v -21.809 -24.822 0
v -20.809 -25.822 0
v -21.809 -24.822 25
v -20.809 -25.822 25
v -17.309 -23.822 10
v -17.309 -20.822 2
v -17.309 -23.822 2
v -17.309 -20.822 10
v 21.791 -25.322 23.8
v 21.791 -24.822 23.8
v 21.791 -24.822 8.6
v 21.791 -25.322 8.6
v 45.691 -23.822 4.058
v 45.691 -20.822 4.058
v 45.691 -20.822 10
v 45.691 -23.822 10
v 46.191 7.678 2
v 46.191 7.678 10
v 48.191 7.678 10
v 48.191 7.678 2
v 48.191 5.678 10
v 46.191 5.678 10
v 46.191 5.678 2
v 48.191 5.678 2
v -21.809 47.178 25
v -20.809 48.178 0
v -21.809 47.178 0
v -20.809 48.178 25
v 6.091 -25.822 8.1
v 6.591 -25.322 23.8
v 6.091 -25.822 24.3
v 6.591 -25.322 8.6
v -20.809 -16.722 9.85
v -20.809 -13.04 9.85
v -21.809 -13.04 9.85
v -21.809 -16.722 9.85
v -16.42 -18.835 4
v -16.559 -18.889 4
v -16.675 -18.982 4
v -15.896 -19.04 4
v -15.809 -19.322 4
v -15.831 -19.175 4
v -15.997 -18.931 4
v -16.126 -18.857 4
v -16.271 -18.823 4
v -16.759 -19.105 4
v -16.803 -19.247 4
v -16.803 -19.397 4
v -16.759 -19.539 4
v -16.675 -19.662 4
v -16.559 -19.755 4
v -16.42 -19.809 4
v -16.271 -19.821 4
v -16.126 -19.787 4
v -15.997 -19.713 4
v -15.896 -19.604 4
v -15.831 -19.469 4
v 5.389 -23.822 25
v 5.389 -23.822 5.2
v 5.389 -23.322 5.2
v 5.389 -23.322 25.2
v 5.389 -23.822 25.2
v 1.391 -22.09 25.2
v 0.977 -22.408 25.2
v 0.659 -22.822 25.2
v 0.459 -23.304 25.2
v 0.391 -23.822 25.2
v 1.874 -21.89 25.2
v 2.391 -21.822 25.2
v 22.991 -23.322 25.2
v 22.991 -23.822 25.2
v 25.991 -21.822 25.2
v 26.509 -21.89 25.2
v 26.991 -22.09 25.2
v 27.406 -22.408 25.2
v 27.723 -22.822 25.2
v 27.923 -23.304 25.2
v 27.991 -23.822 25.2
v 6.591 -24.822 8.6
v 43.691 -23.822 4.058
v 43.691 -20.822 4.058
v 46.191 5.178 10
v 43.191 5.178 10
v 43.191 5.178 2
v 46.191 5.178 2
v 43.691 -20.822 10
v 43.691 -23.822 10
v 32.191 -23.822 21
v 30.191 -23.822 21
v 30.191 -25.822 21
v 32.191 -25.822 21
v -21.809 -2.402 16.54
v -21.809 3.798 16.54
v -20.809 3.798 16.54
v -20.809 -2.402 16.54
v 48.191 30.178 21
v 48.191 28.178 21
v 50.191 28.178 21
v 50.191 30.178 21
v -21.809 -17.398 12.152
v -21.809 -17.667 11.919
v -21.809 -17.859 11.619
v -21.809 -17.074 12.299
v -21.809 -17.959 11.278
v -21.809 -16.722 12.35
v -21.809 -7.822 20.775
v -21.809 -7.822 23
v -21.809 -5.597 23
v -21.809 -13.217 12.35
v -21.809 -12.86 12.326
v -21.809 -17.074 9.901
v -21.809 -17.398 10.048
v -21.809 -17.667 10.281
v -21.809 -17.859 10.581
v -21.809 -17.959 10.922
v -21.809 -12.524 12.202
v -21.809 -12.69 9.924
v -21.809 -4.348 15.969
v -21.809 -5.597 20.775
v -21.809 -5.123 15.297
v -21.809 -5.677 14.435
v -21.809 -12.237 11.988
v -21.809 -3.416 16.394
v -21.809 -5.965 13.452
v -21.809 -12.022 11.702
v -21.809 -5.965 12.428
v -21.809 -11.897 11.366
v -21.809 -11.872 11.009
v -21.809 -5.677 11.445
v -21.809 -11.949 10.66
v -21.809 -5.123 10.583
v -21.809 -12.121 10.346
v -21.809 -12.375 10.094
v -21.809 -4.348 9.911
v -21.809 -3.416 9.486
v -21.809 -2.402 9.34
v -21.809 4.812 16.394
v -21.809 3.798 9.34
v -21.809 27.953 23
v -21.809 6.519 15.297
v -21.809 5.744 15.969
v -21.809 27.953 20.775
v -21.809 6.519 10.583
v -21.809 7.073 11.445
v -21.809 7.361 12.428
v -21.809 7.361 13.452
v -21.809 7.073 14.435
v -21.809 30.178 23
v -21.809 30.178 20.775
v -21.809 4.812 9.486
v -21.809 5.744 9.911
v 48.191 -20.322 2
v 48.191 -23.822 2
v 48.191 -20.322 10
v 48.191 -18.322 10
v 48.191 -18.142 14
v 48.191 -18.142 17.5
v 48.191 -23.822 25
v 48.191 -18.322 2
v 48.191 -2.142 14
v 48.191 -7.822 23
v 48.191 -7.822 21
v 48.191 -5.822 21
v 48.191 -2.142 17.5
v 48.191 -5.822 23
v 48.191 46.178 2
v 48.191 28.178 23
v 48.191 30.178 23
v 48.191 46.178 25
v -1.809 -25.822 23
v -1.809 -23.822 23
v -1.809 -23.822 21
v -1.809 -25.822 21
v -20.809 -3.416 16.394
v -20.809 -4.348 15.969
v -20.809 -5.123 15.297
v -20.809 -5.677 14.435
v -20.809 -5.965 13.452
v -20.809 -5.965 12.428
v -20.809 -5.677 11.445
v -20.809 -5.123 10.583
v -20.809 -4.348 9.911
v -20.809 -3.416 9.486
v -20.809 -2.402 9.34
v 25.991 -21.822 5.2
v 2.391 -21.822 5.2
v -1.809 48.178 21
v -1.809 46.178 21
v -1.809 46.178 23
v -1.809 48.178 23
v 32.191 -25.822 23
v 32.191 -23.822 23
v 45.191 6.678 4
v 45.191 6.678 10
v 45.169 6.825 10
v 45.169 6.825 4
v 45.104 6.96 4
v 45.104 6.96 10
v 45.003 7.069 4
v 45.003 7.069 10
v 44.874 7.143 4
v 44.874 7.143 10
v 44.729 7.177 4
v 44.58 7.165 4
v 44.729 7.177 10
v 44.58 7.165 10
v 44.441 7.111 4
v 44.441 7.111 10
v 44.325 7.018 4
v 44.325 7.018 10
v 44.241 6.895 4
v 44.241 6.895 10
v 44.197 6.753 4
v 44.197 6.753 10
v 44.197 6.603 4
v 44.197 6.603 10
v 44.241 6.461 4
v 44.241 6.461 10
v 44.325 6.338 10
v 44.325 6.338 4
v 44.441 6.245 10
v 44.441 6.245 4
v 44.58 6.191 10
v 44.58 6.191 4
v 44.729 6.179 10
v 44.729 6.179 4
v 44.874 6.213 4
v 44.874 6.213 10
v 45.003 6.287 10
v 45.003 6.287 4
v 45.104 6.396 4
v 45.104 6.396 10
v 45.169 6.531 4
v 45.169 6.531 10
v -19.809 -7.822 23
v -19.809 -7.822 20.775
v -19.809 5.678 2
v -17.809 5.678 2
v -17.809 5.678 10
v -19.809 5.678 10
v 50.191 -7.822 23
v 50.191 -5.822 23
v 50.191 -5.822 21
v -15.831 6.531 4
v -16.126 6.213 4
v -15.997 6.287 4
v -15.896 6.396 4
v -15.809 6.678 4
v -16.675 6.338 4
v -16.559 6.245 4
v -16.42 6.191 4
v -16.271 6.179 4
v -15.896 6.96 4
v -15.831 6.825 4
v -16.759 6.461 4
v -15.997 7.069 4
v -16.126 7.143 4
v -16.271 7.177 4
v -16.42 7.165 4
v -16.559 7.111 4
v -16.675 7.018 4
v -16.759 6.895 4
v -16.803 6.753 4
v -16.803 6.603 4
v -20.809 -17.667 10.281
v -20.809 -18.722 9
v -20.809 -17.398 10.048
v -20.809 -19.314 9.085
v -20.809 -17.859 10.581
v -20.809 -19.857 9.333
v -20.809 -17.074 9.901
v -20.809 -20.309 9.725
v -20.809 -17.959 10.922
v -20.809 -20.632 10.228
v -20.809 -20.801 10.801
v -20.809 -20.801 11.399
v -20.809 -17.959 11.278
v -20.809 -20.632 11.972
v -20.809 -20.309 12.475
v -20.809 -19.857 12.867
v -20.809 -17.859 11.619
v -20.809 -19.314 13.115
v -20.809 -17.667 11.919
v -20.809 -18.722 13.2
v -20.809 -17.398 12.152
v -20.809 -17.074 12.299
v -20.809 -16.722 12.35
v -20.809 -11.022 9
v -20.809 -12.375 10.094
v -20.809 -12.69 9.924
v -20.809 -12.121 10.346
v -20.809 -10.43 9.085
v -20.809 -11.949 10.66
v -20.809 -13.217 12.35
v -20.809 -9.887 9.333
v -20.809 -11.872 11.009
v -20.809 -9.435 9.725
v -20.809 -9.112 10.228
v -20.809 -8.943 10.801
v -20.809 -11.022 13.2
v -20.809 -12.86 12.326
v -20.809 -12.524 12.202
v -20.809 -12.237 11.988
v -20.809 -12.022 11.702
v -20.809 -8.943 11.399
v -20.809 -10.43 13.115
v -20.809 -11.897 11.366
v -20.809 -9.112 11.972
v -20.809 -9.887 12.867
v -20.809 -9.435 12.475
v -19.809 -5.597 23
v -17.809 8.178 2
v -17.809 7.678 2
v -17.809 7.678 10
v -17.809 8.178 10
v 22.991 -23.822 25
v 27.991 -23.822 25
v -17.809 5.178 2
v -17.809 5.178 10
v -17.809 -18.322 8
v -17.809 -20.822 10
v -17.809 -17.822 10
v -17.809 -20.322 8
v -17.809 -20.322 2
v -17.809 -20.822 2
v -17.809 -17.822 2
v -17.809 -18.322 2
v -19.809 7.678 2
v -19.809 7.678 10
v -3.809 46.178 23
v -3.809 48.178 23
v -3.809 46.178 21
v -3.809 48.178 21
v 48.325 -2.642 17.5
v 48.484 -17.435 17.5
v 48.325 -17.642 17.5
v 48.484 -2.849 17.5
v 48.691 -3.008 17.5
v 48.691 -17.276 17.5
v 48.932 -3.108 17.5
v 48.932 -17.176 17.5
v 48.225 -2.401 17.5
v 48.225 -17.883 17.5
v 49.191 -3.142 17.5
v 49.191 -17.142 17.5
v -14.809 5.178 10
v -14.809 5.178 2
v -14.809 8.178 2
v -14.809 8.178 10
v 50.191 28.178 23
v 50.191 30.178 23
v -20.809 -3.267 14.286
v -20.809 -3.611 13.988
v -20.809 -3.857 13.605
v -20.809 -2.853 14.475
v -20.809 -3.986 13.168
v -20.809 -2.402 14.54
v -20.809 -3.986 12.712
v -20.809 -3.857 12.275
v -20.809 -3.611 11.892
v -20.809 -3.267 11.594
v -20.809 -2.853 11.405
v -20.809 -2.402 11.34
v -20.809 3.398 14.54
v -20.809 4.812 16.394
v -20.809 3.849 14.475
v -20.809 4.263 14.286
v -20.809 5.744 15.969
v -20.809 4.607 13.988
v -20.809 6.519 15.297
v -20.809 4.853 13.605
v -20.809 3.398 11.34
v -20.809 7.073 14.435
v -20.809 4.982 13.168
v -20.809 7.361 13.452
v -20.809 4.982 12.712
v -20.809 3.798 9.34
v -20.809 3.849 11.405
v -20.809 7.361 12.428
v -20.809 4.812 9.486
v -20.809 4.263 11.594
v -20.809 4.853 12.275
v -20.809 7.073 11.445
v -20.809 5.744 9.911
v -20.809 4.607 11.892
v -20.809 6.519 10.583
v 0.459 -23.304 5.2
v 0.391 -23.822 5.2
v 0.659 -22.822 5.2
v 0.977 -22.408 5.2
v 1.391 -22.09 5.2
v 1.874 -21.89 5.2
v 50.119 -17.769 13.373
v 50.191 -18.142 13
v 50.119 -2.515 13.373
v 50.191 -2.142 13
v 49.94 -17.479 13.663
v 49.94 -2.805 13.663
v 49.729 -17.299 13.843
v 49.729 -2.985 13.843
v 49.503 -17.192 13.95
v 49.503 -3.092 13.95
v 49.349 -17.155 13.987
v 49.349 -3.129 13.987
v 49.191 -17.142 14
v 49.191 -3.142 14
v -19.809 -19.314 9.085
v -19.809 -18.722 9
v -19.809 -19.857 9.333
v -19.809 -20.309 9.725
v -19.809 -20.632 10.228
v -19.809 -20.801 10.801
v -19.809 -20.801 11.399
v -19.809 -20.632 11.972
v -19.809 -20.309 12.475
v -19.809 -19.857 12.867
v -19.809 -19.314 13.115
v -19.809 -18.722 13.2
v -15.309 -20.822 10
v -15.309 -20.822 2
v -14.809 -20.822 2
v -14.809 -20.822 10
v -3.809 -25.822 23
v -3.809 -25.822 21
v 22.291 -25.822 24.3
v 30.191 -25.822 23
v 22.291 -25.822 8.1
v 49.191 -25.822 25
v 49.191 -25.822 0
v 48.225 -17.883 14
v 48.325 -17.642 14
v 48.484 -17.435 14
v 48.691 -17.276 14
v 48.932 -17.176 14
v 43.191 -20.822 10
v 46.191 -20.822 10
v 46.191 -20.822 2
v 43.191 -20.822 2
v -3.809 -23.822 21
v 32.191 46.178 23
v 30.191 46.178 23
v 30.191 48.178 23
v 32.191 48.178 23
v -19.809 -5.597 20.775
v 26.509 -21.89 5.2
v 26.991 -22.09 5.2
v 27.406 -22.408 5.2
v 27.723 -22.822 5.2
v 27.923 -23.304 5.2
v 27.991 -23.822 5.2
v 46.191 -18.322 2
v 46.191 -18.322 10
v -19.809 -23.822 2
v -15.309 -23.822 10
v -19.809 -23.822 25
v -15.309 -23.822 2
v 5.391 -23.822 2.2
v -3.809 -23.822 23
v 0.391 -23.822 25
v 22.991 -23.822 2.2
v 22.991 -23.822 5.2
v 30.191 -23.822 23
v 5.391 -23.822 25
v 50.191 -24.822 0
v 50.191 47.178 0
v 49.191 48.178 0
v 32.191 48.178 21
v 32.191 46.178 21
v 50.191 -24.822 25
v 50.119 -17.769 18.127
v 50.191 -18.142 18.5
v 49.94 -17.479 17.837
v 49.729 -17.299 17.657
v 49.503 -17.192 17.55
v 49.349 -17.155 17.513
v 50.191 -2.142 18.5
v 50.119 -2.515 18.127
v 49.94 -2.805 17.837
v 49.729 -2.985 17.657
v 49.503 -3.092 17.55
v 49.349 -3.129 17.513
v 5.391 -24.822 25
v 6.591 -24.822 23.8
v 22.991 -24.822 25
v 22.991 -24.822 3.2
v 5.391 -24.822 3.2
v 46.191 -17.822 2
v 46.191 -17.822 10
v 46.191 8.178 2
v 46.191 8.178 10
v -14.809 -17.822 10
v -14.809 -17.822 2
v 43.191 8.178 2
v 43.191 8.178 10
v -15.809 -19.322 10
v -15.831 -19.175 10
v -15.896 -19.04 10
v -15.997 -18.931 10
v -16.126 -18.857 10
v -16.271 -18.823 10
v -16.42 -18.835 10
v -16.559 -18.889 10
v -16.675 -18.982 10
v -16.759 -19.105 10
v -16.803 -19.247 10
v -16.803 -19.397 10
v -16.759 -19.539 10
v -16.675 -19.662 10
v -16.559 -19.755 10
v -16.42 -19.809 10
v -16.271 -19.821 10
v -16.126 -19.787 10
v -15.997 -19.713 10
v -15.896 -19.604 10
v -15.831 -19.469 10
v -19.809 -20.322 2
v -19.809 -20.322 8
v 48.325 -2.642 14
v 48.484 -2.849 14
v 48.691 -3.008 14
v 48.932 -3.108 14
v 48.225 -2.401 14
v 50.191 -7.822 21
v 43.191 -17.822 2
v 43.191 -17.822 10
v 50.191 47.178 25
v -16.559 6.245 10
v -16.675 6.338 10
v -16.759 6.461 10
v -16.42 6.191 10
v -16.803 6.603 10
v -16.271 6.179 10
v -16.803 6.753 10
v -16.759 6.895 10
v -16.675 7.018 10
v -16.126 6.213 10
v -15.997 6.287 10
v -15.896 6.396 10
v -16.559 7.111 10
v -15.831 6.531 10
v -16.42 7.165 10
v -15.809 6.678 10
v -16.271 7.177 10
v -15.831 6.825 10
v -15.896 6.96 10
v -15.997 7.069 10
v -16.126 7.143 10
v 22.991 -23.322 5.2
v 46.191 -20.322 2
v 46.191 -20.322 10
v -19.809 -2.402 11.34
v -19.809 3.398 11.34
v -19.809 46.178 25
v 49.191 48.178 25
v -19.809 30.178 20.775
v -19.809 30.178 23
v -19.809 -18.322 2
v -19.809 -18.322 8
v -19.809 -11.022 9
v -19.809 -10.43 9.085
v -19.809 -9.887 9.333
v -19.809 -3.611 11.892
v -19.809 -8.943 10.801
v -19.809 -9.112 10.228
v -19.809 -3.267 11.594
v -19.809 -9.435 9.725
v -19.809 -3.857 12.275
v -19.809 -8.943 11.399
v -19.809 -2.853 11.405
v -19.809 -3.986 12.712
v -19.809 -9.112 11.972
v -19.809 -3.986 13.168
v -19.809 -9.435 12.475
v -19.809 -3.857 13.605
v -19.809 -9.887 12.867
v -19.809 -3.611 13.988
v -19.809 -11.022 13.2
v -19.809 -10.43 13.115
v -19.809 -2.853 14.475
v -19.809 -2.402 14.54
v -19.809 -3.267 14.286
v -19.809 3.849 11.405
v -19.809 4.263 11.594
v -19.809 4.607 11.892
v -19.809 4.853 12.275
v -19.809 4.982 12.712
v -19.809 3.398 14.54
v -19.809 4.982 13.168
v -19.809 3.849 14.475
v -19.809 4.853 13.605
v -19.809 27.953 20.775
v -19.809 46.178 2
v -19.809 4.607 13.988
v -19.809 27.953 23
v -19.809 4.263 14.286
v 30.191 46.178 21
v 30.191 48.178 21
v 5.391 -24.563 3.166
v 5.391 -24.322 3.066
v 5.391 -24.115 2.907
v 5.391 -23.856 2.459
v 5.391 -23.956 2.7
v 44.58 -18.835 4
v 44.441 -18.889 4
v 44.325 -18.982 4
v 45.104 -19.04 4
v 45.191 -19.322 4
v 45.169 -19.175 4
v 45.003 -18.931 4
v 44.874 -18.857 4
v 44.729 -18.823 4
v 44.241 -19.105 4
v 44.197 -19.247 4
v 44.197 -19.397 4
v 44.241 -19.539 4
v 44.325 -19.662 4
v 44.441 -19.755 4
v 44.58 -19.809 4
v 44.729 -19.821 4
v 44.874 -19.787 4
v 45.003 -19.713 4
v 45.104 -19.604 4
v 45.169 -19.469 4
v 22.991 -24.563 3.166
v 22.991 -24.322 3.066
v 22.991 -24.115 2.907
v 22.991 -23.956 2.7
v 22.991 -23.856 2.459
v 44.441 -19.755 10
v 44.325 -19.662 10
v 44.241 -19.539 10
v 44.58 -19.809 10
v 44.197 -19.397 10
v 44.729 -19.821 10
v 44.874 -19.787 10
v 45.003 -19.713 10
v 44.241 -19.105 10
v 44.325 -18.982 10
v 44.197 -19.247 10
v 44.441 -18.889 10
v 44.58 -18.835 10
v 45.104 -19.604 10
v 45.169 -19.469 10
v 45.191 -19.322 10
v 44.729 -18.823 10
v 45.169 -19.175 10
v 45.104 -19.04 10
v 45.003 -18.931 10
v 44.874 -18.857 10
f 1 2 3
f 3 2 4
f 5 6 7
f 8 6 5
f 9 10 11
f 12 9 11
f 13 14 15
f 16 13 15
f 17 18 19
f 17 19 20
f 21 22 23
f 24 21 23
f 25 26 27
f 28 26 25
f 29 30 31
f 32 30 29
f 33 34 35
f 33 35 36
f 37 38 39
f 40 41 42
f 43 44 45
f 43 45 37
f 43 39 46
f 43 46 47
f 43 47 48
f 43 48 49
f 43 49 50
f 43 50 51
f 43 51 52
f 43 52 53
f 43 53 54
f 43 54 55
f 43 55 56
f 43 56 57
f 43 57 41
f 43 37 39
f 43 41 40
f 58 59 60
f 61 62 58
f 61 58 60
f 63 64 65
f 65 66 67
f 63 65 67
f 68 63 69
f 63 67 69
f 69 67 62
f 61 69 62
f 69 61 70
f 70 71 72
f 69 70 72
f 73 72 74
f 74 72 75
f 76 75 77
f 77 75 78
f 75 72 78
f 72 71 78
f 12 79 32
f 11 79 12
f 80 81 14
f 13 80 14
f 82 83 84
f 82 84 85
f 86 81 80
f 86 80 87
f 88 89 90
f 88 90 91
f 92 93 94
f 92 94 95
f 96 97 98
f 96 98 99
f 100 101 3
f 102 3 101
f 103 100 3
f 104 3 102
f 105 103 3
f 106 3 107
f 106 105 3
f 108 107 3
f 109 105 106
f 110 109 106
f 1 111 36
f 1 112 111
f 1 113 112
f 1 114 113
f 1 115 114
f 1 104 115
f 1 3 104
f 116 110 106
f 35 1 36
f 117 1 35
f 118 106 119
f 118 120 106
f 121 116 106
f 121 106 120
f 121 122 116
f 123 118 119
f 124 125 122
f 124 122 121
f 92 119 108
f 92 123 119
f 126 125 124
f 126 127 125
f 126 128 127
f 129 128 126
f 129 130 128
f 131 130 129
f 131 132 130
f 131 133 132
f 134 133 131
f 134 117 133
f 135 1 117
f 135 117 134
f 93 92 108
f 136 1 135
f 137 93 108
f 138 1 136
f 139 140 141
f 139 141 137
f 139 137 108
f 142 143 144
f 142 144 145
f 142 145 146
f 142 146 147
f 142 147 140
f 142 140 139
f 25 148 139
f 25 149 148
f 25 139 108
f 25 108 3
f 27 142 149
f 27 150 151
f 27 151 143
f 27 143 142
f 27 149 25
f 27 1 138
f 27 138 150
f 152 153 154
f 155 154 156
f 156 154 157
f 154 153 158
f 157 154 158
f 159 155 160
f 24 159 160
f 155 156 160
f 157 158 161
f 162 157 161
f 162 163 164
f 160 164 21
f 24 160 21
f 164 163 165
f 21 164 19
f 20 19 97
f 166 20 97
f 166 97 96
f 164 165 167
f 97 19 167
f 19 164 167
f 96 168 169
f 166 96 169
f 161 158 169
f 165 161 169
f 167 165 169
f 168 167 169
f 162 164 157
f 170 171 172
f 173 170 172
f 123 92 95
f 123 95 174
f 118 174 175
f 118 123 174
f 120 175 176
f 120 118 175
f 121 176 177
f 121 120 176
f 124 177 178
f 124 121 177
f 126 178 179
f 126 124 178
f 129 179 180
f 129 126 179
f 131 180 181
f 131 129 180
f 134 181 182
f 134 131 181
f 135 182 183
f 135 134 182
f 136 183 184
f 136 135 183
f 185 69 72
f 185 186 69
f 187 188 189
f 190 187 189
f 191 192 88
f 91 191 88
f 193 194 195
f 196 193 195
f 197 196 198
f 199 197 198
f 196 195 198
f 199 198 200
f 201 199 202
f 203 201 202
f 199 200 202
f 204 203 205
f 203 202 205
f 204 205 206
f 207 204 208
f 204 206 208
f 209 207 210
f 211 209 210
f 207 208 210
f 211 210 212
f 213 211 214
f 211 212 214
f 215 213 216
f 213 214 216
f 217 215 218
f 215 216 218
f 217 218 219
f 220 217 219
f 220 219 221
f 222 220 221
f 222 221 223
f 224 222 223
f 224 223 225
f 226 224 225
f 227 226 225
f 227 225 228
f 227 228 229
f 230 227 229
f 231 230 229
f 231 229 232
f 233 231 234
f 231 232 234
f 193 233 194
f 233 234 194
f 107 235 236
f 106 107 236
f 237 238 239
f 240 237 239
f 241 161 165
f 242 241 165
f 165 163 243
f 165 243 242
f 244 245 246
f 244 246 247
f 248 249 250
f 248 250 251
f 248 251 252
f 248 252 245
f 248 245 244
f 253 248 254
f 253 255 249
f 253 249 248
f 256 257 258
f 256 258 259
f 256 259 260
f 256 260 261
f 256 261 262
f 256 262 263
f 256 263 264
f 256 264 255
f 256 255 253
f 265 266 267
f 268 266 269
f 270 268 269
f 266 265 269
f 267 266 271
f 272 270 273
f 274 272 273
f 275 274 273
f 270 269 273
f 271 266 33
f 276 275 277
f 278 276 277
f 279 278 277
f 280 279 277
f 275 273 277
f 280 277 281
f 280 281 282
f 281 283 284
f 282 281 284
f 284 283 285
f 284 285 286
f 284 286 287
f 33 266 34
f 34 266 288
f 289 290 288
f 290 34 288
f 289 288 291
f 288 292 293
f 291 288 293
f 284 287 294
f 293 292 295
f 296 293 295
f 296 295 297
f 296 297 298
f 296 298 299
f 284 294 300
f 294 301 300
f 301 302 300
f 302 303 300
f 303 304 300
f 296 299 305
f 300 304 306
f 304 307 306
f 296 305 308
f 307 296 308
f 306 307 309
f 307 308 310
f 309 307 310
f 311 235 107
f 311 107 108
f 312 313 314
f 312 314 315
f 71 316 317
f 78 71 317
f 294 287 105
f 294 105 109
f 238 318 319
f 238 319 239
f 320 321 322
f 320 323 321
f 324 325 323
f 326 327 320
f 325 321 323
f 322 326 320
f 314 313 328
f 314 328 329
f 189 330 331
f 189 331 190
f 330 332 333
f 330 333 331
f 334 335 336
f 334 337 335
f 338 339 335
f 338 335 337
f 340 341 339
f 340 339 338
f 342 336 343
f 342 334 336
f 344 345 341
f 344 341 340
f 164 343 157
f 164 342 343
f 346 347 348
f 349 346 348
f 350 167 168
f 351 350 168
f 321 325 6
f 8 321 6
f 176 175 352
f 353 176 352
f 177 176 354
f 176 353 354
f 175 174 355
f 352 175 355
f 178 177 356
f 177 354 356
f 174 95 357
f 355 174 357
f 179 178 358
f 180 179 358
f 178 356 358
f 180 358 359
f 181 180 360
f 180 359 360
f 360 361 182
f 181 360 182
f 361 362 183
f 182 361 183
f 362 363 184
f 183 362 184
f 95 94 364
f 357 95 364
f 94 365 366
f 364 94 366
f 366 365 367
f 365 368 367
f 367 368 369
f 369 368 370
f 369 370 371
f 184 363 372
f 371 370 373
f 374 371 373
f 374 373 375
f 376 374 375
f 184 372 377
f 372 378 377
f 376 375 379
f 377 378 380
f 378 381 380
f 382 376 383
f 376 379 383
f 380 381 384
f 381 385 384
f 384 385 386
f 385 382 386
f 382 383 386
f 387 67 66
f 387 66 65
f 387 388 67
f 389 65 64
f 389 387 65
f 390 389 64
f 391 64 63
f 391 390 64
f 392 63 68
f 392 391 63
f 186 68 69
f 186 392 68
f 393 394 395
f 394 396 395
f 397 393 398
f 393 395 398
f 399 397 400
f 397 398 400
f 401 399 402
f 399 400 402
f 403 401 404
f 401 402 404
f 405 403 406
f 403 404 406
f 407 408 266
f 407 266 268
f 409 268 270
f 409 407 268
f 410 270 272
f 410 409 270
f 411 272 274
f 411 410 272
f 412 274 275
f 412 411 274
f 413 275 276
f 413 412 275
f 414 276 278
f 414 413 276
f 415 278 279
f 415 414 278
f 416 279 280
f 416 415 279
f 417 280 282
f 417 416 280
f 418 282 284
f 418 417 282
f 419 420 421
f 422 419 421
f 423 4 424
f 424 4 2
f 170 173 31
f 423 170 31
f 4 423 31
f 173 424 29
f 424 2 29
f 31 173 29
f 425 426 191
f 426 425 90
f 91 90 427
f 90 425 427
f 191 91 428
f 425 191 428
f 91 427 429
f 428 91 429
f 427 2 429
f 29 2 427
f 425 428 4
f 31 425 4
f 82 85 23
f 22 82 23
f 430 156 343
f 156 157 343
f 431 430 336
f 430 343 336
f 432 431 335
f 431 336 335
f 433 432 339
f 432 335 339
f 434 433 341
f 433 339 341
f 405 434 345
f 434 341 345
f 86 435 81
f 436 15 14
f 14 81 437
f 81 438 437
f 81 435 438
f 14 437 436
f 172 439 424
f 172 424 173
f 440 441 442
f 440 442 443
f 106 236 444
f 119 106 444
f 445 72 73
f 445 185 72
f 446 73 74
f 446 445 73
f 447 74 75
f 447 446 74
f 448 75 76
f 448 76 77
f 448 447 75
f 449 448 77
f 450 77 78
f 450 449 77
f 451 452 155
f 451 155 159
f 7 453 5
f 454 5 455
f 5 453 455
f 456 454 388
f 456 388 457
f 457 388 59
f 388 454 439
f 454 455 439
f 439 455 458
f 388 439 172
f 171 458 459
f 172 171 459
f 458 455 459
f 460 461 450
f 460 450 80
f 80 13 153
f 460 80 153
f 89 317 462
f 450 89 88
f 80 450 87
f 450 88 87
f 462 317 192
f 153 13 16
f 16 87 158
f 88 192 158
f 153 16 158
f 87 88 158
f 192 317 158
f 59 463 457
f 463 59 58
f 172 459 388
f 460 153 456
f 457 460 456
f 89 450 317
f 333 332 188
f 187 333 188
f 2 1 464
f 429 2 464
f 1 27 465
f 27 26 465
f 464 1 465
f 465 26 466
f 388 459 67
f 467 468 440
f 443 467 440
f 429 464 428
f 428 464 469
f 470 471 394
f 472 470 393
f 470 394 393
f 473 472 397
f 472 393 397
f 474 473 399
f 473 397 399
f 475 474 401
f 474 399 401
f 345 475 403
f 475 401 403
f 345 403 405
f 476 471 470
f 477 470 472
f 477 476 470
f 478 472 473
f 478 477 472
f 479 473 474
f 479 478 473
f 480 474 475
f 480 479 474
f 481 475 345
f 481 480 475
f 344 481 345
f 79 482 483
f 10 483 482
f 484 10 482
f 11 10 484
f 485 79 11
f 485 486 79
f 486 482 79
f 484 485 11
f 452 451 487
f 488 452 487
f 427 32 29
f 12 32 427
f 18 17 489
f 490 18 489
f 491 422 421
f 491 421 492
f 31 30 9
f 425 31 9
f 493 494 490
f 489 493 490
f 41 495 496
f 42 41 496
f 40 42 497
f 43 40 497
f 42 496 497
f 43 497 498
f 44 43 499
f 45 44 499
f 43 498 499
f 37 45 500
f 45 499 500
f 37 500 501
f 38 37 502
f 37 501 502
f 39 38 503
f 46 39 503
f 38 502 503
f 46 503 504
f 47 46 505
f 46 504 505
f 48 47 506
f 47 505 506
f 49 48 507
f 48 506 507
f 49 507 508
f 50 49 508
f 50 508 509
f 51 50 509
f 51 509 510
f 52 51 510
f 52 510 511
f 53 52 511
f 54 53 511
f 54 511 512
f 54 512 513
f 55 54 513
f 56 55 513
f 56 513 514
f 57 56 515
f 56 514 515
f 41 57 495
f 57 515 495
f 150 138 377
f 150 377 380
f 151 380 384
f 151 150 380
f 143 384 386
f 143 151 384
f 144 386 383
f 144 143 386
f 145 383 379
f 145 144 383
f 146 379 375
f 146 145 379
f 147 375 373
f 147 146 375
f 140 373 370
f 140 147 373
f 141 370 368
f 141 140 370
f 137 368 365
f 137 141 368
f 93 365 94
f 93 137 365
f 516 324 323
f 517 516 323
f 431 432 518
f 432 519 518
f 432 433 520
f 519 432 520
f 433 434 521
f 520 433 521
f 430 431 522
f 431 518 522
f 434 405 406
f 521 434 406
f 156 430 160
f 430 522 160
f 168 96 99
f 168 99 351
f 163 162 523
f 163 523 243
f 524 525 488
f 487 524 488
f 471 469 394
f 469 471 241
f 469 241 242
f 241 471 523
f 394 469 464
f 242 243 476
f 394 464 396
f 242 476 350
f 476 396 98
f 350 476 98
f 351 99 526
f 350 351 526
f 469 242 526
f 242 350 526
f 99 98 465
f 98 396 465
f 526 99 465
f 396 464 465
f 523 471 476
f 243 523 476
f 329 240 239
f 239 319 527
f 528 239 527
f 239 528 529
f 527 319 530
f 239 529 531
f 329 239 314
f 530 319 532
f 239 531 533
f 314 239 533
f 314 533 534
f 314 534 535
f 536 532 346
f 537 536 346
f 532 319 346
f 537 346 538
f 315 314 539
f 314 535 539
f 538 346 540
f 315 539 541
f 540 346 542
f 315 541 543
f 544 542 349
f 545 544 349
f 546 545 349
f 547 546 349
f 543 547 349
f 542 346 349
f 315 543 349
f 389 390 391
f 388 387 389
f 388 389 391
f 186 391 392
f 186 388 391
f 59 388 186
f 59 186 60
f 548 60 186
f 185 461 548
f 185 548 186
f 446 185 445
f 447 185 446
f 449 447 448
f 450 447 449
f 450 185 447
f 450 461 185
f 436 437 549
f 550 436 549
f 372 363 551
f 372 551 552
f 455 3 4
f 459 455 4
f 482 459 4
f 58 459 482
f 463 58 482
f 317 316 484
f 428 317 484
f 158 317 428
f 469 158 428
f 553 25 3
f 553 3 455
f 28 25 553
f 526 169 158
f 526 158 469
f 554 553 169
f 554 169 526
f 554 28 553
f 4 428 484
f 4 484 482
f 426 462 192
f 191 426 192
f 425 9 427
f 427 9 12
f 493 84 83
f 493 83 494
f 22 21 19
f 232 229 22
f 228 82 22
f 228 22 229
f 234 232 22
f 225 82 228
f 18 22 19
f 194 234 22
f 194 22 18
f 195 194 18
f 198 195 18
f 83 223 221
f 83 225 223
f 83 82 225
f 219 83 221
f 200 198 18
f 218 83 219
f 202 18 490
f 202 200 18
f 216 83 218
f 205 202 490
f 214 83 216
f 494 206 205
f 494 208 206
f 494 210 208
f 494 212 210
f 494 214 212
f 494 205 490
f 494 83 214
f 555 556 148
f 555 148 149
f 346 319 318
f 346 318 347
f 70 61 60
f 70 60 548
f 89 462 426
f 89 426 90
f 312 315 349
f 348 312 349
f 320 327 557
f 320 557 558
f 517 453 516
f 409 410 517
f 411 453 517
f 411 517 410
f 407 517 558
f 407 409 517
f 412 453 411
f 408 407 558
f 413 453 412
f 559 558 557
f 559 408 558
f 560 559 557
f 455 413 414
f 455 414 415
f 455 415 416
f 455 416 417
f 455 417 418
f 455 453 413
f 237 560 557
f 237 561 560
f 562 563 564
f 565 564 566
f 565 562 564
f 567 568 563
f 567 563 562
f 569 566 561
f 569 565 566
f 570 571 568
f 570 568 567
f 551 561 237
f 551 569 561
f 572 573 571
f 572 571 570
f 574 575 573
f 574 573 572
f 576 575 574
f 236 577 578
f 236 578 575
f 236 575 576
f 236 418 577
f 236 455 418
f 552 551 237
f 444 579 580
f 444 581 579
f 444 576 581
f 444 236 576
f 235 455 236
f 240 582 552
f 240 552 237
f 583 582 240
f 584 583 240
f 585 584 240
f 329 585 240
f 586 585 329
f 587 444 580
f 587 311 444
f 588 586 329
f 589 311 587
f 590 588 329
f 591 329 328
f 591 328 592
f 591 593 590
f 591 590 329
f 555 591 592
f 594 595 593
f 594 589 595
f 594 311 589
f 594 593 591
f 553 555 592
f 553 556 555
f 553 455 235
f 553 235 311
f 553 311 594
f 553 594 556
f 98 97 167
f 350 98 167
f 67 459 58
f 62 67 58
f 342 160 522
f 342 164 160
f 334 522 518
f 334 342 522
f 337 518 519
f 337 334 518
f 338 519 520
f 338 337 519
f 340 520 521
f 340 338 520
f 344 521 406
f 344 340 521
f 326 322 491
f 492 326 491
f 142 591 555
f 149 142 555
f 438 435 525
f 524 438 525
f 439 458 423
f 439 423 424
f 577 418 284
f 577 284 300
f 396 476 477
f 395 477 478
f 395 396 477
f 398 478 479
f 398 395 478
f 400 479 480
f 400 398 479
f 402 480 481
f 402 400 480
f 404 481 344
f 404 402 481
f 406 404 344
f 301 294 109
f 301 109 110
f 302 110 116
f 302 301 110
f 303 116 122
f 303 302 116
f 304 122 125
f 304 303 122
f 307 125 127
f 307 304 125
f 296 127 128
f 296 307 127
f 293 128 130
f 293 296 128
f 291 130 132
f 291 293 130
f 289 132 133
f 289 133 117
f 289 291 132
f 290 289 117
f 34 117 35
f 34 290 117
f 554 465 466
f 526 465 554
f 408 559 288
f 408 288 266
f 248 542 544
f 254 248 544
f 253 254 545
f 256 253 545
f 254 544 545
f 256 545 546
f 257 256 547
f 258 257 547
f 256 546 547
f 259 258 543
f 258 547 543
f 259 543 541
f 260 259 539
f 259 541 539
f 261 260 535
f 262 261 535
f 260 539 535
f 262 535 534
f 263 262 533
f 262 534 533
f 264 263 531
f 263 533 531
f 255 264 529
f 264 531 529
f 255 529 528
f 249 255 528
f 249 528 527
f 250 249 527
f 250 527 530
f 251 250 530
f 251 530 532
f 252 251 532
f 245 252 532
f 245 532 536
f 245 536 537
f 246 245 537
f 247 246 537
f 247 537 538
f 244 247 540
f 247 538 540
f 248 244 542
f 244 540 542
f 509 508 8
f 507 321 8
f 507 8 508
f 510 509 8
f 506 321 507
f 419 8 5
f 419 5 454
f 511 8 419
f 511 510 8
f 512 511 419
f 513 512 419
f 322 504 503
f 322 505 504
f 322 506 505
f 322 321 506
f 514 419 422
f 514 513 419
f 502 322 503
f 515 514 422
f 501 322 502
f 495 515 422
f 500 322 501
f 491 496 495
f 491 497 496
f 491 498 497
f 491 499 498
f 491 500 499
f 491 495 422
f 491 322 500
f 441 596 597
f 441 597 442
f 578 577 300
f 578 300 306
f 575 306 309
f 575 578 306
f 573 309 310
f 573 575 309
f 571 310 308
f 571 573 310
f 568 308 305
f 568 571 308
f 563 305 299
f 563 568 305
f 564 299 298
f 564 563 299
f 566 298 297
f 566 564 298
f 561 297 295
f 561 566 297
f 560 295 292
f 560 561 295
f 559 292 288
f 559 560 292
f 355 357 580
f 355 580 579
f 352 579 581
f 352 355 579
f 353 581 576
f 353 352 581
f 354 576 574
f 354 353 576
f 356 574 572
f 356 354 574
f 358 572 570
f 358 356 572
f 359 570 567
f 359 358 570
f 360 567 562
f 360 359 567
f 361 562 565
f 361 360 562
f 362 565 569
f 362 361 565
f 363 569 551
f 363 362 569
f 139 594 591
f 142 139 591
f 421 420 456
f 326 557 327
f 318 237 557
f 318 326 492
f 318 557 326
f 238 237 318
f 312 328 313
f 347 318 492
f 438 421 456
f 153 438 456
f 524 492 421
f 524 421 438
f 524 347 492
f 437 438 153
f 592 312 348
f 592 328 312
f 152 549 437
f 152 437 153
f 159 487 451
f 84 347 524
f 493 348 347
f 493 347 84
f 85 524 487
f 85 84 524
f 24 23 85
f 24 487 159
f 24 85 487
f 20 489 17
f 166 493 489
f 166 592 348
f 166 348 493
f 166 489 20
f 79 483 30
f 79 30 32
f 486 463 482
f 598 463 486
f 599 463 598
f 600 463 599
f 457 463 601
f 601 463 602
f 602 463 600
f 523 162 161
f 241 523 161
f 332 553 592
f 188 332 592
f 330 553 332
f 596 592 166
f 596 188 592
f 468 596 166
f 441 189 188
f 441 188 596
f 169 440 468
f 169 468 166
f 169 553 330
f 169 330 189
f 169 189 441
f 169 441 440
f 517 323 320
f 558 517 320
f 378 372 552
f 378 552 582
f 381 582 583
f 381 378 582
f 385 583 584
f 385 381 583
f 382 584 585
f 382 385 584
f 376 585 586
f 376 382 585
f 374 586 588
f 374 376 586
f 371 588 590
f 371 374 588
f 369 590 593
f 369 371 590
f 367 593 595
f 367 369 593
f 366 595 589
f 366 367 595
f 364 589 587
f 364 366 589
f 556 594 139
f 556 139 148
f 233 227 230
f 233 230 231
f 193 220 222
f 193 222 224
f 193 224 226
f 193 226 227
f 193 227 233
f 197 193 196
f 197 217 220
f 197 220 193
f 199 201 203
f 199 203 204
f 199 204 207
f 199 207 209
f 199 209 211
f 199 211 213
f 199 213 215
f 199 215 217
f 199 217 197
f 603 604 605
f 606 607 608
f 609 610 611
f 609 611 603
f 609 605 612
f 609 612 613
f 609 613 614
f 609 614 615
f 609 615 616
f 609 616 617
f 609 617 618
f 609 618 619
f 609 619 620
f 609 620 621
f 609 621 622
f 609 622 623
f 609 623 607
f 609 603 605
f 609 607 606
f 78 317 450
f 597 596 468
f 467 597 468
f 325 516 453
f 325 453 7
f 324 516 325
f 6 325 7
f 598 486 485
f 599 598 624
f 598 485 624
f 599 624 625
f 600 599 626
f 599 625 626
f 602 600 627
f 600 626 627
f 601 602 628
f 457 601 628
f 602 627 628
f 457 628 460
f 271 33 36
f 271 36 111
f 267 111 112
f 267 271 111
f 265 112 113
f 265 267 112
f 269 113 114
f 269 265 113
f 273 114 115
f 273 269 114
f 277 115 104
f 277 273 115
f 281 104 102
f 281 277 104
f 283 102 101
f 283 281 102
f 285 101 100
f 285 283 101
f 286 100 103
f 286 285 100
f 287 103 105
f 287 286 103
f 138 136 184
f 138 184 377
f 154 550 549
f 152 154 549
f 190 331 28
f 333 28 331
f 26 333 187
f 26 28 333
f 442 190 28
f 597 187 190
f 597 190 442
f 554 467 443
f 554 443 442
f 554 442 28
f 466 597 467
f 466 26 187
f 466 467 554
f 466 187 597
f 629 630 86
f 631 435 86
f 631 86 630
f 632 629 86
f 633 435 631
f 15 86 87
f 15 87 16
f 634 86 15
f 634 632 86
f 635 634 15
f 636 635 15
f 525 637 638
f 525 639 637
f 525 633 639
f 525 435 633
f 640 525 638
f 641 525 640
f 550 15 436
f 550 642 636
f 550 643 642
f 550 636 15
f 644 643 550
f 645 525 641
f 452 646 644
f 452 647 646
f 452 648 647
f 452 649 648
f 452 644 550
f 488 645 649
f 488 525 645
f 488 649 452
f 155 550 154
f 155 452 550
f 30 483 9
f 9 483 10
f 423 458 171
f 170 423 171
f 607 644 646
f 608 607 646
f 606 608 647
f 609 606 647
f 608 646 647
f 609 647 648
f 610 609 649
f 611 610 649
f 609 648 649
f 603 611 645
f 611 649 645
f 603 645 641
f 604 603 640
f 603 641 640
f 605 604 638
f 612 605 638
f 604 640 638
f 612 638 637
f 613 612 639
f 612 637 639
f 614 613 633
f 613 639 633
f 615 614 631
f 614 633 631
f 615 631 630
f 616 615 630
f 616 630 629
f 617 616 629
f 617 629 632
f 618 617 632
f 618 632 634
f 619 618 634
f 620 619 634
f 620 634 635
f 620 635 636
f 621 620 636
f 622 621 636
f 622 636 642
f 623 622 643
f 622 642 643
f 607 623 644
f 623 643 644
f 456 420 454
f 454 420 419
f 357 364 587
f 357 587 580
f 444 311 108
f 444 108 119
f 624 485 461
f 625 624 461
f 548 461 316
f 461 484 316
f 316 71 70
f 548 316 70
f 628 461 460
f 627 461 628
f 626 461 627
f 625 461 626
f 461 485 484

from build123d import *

# Parameters (mm, degrees)
SKETCH_1_W           = 72
SKETCH_1_H           = 74
EXTRUDE_1_DEPTH      = 25
SKETCH_2_W           = 68
SKETCH_2_H           = 70
CUT_EXTRUDE_1_DEPTH  = 23
CUT_EXTRUDE_2_REACH  = 93.259
SKETCH_3_W           = 2
SKETCH_3_H           = 2
CUT_EXTRUDE_3_REACH  = 90.578
SKETCH_4_W           = 2
SKETCH_4_H           = 2
CUT_EXTRUDE_4_REACH  = 93.259
SKETCH_5_W           = 2
SKETCH_5_H           = 2
CUT_EXTRUDE_5_REACH  = 90.578
SKETCH_6_W           = 2.225296774
SKETCH_6_H           = 2.225296773
SKETCH_6_H_2         = 2.225296774
SKETCH_7_W           = 3
SKETCH_7_H           = 3
EXTRUDE_2_DEPTH      = 8
SKETCH_10_R          = 0.5
CUT_EXTRUDE_6_DEPTH  = 6
EXTRUDE_3_REACH      = 89.006
SKETCH_12_W          = 6
SKETCH_12_H          = 2
SKETCH_12_W_2        = 8
EXTRUDE_4_REACH      = 89.006
SKETCH_13_W          = 8
SKETCH_13_H          = 2
EXTRUDE_5_REACH      = 90.911
SKETCH_14_W          = 2
SKETCH_14_H          = 8
SKETCH_14_H_2        = 5.942409556
CUT_EXTRUDE_8_DEPTH  = 1
CUT_EXTRUDE_9_DEPTH  = 1
CUT_EXTRUDE_10_DEPTH = 1
CUT_EXTRUDE_11_DEPTH = 1
CUT_EXTRUDE_12_REACH = 92.167
SKETCH_21_W          = 3.5
SKETCH_21_H          = 14
SKETCH_22_W          = 17.6
SKETCH_22_H          = 21.8
CUT_EXTRUDE_13_DEPTH = 1
SKETCH_24_W          = 15.2
SKETCH_24_H          = 15.2
CUT_EXTRUDE_14_DEPTH = 1
SKETCH_27_W          = 27.6
SKETCH_27_H          = 20
EXTRUDE_6_DEPTH      = 2
CUT_EXTRUDE_16_REACH = 75.995
SKETCH_28_W          = 17.602386018
SKETCH_28_H          = 0.5
FILLET_1_R           = 1
FILLET_2_R           = 2
CHAMFER_1_SIZE       = 1
FILLET_3_R           = 1
FILLET_4_R           = 1
CHAMFER_3_SIZE       = 0.5


with BuildPart() as part:
    # 草图1 → 凸台-拉伸1 (new body)
    with BuildSketch(Plane.XY):
        with Locations((14.191275168, 11.177993267)):
            Rectangle(SKETCH_1_W, SKETCH_1_H)
    extrude(amount=EXTRUDE_1_DEPTH)

    # 草图2 → 切除-拉伸1 (cut)
    with BuildSketch(Plane.XY.offset(25)):
        with Locations((14.191275168, 11.177993267)):
            Rectangle(SKETCH_2_W, SKETCH_2_H)
    extrude(amount=-CUT_EXTRUDE_1_DEPTH, mode=Mode.SUBTRACT)

    # 草图3 → 切除-拉伸2 (cut, up to next)
    with BuildSketch(Plane.XZ.offset(-46.177993267), mode=Mode.PRIVATE) as cut_extrude_2_sk1:
        with Locations((-2.808724832, 22)):
            Rectangle(SKETCH_3_W, SKETCH_3_H)
    cut_extrude_2_tool1 = extrude(cut_extrude_2_sk1.sketch, amount=-CUT_EXTRUDE_2_REACH, mode=Mode.PRIVATE) & part.part
    # 草图3 → 切除-拉伸2 (cut, up to next)
    with BuildSketch(Plane.XZ.offset(-46.177993267), mode=Mode.PRIVATE) as cut_extrude_2_sk2:
        with Locations((31.191275168, 22)):
            Rectangle(SKETCH_3_W, SKETCH_3_H)
    cut_extrude_2_tool2 = extrude(cut_extrude_2_sk2.sketch, amount=-CUT_EXTRUDE_2_REACH, mode=Mode.PRIVATE) & part.part
    add(cut_extrude_2_tool1.solids().sort_by_distance((-2.808725, 46.177993, 22))[0], mode=Mode.SUBTRACT)
    add(cut_extrude_2_tool2.solids().sort_by_distance((31.191275, 46.177993, 22))[0], mode=Mode.SUBTRACT)

    # 草图4 → 切除-拉伸3 (cut, up to next)
    with BuildSketch(Plane.ZY.offset(-48.191275168), mode=Mode.PRIVATE) as cut_extrude_3_sk1:
        with Locations((22, 29.177993267)):
            Rectangle(SKETCH_4_W, SKETCH_4_H)
    cut_extrude_3_tool1 = extrude(cut_extrude_3_sk1.sketch, amount=-CUT_EXTRUDE_3_REACH, mode=Mode.PRIVATE) & part.part
    # 草图4 → 切除-拉伸3 (cut, up to next)
    with BuildSketch(Plane.ZY.offset(-48.191275168), mode=Mode.PRIVATE) as cut_extrude_3_sk2:
        with Locations((22, -6.822006733)):
            Rectangle(SKETCH_4_W, SKETCH_4_H)
    cut_extrude_3_tool2 = extrude(cut_extrude_3_sk2.sketch, amount=-CUT_EXTRUDE_3_REACH, mode=Mode.PRIVATE) & part.part
    add(cut_extrude_3_tool1.solids().sort_by_distance((48.191275, 29.177993, 22))[0], mode=Mode.SUBTRACT)
    add(cut_extrude_3_tool2.solids().sort_by_distance((48.191275, -6.822007, 22))[0], mode=Mode.SUBTRACT)

    # 草图5 → 切除-拉伸4 (cut, up to next)
    with BuildSketch(Plane(origin=(0, -23.822006733, 0), x_dir=(1, 0, 0), z_dir=(0, 1, 0)), mode=Mode.PRIVATE) as cut_extrude_4_sk1:
        with Locations((31.191275168, -22)):
            Rectangle(SKETCH_5_W, SKETCH_5_H)
    cut_extrude_4_tool1 = extrude(cut_extrude_4_sk1.sketch, amount=-CUT_EXTRUDE_4_REACH, mode=Mode.PRIVATE) & part.part
    # 草图5 → 切除-拉伸4 (cut, up to next)
    with BuildSketch(Plane(origin=(0, -23.822006733, 0), x_dir=(1, 0, 0), z_dir=(0, 1, 0)), mode=Mode.PRIVATE) as cut_extrude_4_sk2:
        with Locations((-2.808724832, -22)):
            Rectangle(SKETCH_5_W, SKETCH_5_H)
    cut_extrude_4_tool2 = extrude(cut_extrude_4_sk2.sketch, amount=-CUT_EXTRUDE_4_REACH, mode=Mode.PRIVATE) & part.part
    add(cut_extrude_4_tool1.solids().sort_by_distance((31.191275, -23.822007, 22))[0], mode=Mode.SUBTRACT)
    add(cut_extrude_4_tool2.solids().sort_by_distance((-2.808725, -23.822007, 22))[0], mode=Mode.SUBTRACT)

    # 草图6 → 切除-拉伸5 (cut, up to next)
    with BuildSketch(Plane(origin=(-19.808724832, 0, 0), x_dir=(0, 0, -1), z_dir=(1, 0, 0)), mode=Mode.PRIVATE) as cut_extrude_5_sk1:
        with Locations((-21.887351613, 29.06534488)):
            Rectangle(SKETCH_6_W, SKETCH_6_H)
    cut_extrude_5_tool1 = extrude(cut_extrude_5_sk1.sketch, amount=-CUT_EXTRUDE_5_REACH, mode=Mode.PRIVATE) & part.part
    # 草图6 → 切除-拉伸5 (cut, up to next)
    with BuildSketch(Plane(origin=(-19.808724832, 0, 0), x_dir=(0, 0, -1), z_dir=(1, 0, 0)), mode=Mode.PRIVATE) as cut_extrude_5_sk2:
        with Locations((-21.887351613, -6.709358346)):
            Rectangle(SKETCH_6_W, SKETCH_6_H_2)
    cut_extrude_5_tool2 = extrude(cut_extrude_5_sk2.sketch, amount=-CUT_EXTRUDE_5_REACH, mode=Mode.PRIVATE) & part.part
    add(cut_extrude_5_tool1.solids().sort_by_distance((-19.808725, 29.065345, 21.887352))[0], mode=Mode.SUBTRACT)
    add(cut_extrude_5_tool2.solids().sort_by_distance((-19.808725, -6.709358, 21.887352))[0], mode=Mode.SUBTRACT)

    # 草图7 → 凸台-拉伸2 (add)
    with BuildSketch(Plane.XY.offset(2)):
        with Locations((-16.308724832, -19.322006733)):
            Rectangle(SKETCH_7_W, SKETCH_7_H)
        with Locations((-16.308724832, 6.677993267)):
            Rectangle(SKETCH_7_W, SKETCH_7_H)
        with Locations((44.691275168, -19.322006733)):
            Rectangle(SKETCH_7_W, SKETCH_7_H)
        with Locations((44.691275168, 6.677993267)):
            Rectangle(SKETCH_7_W, SKETCH_7_H)
    extrude(amount=EXTRUDE_2_DEPTH)

    # 草图10 → 切除-拉伸6 (cut)
    with BuildSketch(Plane.XY.offset(10)):
        with Locations((44.691275168, 6.677993267)):
            Circle(SKETCH_10_R)
        with Locations((44.691275168, -19.322006733)):
            Circle(SKETCH_10_R)
        with Locations((-16.308724832, -19.322006733)):
            Circle(SKETCH_10_R)
        with Locations((-16.308724832, 6.677993267)):
            Circle(SKETCH_10_R)
    extrude(amount=-CUT_EXTRUDE_6_DEPTH, mode=Mode.SUBTRACT)

    # 草图12 → 凸台-拉伸3 (add, up to next)
    with BuildSketch(Plane.ZY.offset(17.808724832), mode=Mode.PRIVATE) as extrude_3_sk1:
        with Locations((5, -19.322006733)):
            Rectangle(SKETCH_12_W, SKETCH_12_H)
    extrude_3_tool1 = extrude(extrude_3_sk1.sketch, amount=EXTRUDE_3_REACH, mode=Mode.PRIVATE) - part.part
    # 草图12 → 凸台-拉伸3 (add, up to next)
    with BuildSketch(Plane.ZY.offset(17.808724832), mode=Mode.PRIVATE) as extrude_3_sk2:
        with Locations((6, 6.677993267)):
            Rectangle(SKETCH_12_W_2, SKETCH_12_H)
    extrude_3_tool2 = extrude(extrude_3_sk2.sketch, amount=EXTRUDE_3_REACH, mode=Mode.PRIVATE) - part.part
    add(extrude_3_tool1.solids().sort_by_distance((-17.808725, -19.322007, 5))[0])
    add(extrude_3_tool2.solids().sort_by_distance((-17.808725, 6.677993, 6))[0])

    # 草图13 → 凸台-拉伸4 (add, up to next)
    with BuildSketch(Plane(origin=(46.191275168, 0, 0), x_dir=(0, 0, -1), z_dir=(1, 0, 0)), mode=Mode.PRIVATE) as extrude_4_sk1:
        with Locations((-6, 6.677993267)):
            Rectangle(SKETCH_13_W, SKETCH_13_H)
    extrude_4_tool1 = extrude(extrude_4_sk1.sketch, amount=EXTRUDE_4_REACH, mode=Mode.PRIVATE) - part.part
    # 草图13 → 凸台-拉伸4 (add, up to next)
    with BuildSketch(Plane(origin=(46.191275168, 0, 0), x_dir=(0, 0, -1), z_dir=(1, 0, 0)), mode=Mode.PRIVATE) as extrude_4_sk2:
        with Locations((-6, -19.322006733)):
            Rectangle(SKETCH_13_W, SKETCH_13_H)
    extrude_4_tool2 = extrude(extrude_4_sk2.sketch, amount=EXTRUDE_4_REACH, mode=Mode.PRIVATE) - part.part
    add(extrude_4_tool1.solids().sort_by_distance((46.191275, 6.677993, 6))[0])
    add(extrude_4_tool2.solids().sort_by_distance((46.191275, -19.322007, 6))[0])

    # 草图14 → 凸台-拉伸5 (add, up to next)
    with BuildSketch(Plane.XZ.offset(20.822006733), mode=Mode.PRIVATE) as extrude_5_sk1:
        with Locations((-16.308724832, 6)):
            Rectangle(SKETCH_14_W, SKETCH_14_H)
    extrude_5_tool1 = extrude(extrude_5_sk1.sketch, amount=EXTRUDE_5_REACH, mode=Mode.PRIVATE) - part.part
    # 草图14 → 凸台-拉伸5 (add, up to next)
    with BuildSketch(Plane.XZ.offset(20.822006733), mode=Mode.PRIVATE) as extrude_5_sk2:
        with Locations((44.691275168, 7.028795222)):
            Rectangle(SKETCH_14_W, SKETCH_14_H_2)
    extrude_5_tool2 = extrude(extrude_5_sk2.sketch, amount=EXTRUDE_5_REACH, mode=Mode.PRIVATE) - part.part
    add(extrude_5_tool1.solids().sort_by_distance((-16.308725, -20.822007, 6))[0])
    add(extrude_5_tool2.solids().sort_by_distance((44.691275, -20.822007, 7.028795))[0])

    # 草图15 → 切除-拉伸8 (cut)
    with BuildSketch(Plane.ZY.offset(21.808724832)):
        with BuildLine():
            Line((16.54, 3.797993267), (16.54, -2.402006733))
            ThreePointArc((16.54, -2.402006733), (12.94, -6.002006733), (9.34, -2.402006733))
            Line((9.34, -2.402006733), (9.34, 3.797993267))
            ThreePointArc((9.34, 3.797993267), (12.94, 7.397993267), (16.54, 3.797993267))
        make_face()
    extrude(amount=-CUT_EXTRUDE_8_DEPTH, mode=Mode.SUBTRACT)

    # 草图18 → 切除-拉伸9 (cut)
    with BuildSketch(Plane.ZY.offset(20.808724832)):
        with BuildLine():
            Line((14.54, 3.397993267), (14.54, -2.402006733))
            ThreePointArc((14.54, -2.402006733), (12.94, -4.002006733), (11.34, -2.402006733))
            Line((11.34, -2.402006733), (11.34, 3.397993267))
            ThreePointArc((11.34, 3.397993267), (12.94, 4.997993267), (14.54, 3.397993267))
        make_face()
    extrude(amount=-CUT_EXTRUDE_9_DEPTH, mode=Mode.SUBTRACT)

    # 草图19 → 切除-拉伸10 (cut)
    with BuildSketch(Plane(origin=(-19.808724832, 0, 0), x_dir=(0, 0, -1), z_dir=(1, 0, 0))):
        with BuildLine():
            Line((-9, -11.022006733), (-9, -18.722006733))
            ThreePointArc((-9, -18.722006733), (-11.1, -20.822006733), (-13.2, -18.722006733))
            Line((-13.2, -18.722006733), (-13.2, -11.022006733))
            ThreePointArc((-13.2, -11.022006733), (-11.1, -8.922006733), (-9, -11.022006733))
        make_face()
    extrude(amount=-CUT_EXTRUDE_10_DEPTH, mode=Mode.SUBTRACT)

    # 草图20 → 切除-拉伸11 (cut)
    with BuildSketch(Plane(origin=(-20.808724832, 0, 0), x_dir=(0, 0, -1), z_dir=(1, 0, 0))):
        with BuildLine():
            Line((-12.35, -16.722006733), (-12.35, -13.216845353))
            ThreePointArc((-12.35, -13.216845353), (-11.188796635, -11.871989848), (-9.85, -13.040173546))
            Line((-9.85, -13.040173546), (-9.85, -16.722006733))
            ThreePointArc((-9.85, -16.722006733), (-11.1, -17.972006733), (-12.35, -16.722006733))
        make_face()
    extrude(amount=-CUT_EXTRUDE_11_DEPTH, mode=Mode.SUBTRACT)

    # 草图21 → 切除-拉伸12 (cut, up to next)
    with BuildSketch(Plane(origin=(50.191275168, 0, 0), x_dir=(0, 0, -1), z_dir=(1, 0, 0)), mode=Mode.PRIVATE) as cut_extrude_12_sk1:
        with Locations((-15.75, -10.142006733)):
            Rectangle(SKETCH_21_W, SKETCH_21_H)
    cut_extrude_12_tool1 = extrude(cut_extrude_12_sk1.sketch, amount=-CUT_EXTRUDE_12_REACH, mode=Mode.PRIVATE) & part.part
    add(cut_extrude_12_tool1.solids().sort_by_distance((50.191275, -10.142007, 15.75))[0], mode=Mode.SUBTRACT)

    # 草图22 → 切除-拉伸13 (cut)
    with BuildSketch(Plane(origin=(0, -23.822006733, 0), x_dir=(1, 0, 0), z_dir=(0, 1, 0))):
        with Locations((14.191275168, -14.1)):
            Rectangle(SKETCH_22_W, SKETCH_22_H)
    extrude(amount=-CUT_EXTRUDE_13_DEPTH, mode=Mode.SUBTRACT)

    # 草图24 → 切除-拉伸14 (cut)
    with BuildSketch(Plane(origin=(0, -24.822006733, 0), x_dir=(1, 0, 0), z_dir=(0, 1, 0))):
        with Locations((14.191275168, -16.2)):
            Rectangle(SKETCH_24_W, SKETCH_24_H)
    extrude(amount=-CUT_EXTRUDE_14_DEPTH, mode=Mode.SUBTRACT)

    # 草图27 → 凸台-拉伸6 (add)
    with BuildSketch(Plane(origin=(0, -23.822006733, 0), x_dir=(1, 0, 0), z_dir=(0, 1, 0))):
        with Locations((14.191275168, -15.2)):
            Rectangle(SKETCH_27_W, SKETCH_27_H)
    extrude(amount=EXTRUDE_6_DEPTH)

    # 草图28 → 切除-拉伸16 (cut, up to next)
    with BuildSketch(Plane.XY.offset(25.2), mode=Mode.PRIVATE) as cut_extrude_16_sk1:
        with Locations((14.190082159, -23.572006733)):
            Rectangle(SKETCH_28_W, SKETCH_28_H)
    cut_extrude_16_tool1 = extrude(cut_extrude_16_sk1.sketch, amount=-CUT_EXTRUDE_16_REACH, mode=Mode.PRIVATE) & part.part
    add(cut_extrude_16_tool1.solids().sort_by_distance((14.190082, -23.572007, 25.2))[0], mode=Mode.SUBTRACT)

    # 圆角1
    fillet_1_edges = [part.edges().sort_by_distance(p)[0] for p in [
        (14.191275168, -23.822006733, 3.2),
    ]]
    fillet(fillet_1_edges, radius=FILLET_1_R - 0.0001)  # a hair under: the kernel refuses the full size

    # 圆角2
    fillet_2_edges = [part.edges().sort_by_distance(p)[0] for p in [
        (0.391275168, -21.822006733, 15.2),
        (27.991275168, -21.822006733, 15.2),
    ]]
    fillet(fillet_2_edges, radius=FILLET_2_R - 0.0001)  # a hair under: the kernel refuses the full size

    # 倒角1
    chamfer_1_edges = [part.edges().sort_by_distance(p)[0] for p in [
        (-21.808724832, 48.177993267, 12.5),
        (50.191275168, 48.177993267, 12.5),
        (50.191275168, -25.822006733, 12.5),
        (-21.808724832, -25.822006733, 12.5),
    ]]
    chamfer(chamfer_1_edges, length=CHAMFER_1_SIZE)

    # 圆角3
    fillet_3_edges = [part.edges().sort_by_distance(p)[0] for p in [
        (48.191275168, -17.142006733, 15.75),
        (48.191275168, -3.142006733, 15.75),
    ]]
    fillet(fillet_3_edges, radius=FILLET_3_R)

    # 圆角4
    fillet_4_edges = [part.edges().sort_by_distance(p)[0] for p in [
        (50.191275168, -10.142006733, 17.5),
        (50.191275168, -10.142006733, 14),
        (50.191275168, -17.142006733, 15.75),
        (50.191275168, -3.142006733, 15.75),
    ]]
    fillet(fillet_4_edges, radius=FILLET_4_R - 0.0001)  # a hair under: the kernel refuses the full size

    # 倒角3
    chamfer_3_edges = [part.edges().sort_by_distance(p)[0] for p in [
        (6.591275168, -25.822006733, 16.2),
        (14.191275168, -25.822006733, 8.6),
        (21.791275168, -25.822006733, 16.2),
        (14.191275168, -25.822006733, 23.8),
    ]]
    chamfer(chamfer_3_edges, length=CHAMFER_3_SIZE)


solid = part.part
